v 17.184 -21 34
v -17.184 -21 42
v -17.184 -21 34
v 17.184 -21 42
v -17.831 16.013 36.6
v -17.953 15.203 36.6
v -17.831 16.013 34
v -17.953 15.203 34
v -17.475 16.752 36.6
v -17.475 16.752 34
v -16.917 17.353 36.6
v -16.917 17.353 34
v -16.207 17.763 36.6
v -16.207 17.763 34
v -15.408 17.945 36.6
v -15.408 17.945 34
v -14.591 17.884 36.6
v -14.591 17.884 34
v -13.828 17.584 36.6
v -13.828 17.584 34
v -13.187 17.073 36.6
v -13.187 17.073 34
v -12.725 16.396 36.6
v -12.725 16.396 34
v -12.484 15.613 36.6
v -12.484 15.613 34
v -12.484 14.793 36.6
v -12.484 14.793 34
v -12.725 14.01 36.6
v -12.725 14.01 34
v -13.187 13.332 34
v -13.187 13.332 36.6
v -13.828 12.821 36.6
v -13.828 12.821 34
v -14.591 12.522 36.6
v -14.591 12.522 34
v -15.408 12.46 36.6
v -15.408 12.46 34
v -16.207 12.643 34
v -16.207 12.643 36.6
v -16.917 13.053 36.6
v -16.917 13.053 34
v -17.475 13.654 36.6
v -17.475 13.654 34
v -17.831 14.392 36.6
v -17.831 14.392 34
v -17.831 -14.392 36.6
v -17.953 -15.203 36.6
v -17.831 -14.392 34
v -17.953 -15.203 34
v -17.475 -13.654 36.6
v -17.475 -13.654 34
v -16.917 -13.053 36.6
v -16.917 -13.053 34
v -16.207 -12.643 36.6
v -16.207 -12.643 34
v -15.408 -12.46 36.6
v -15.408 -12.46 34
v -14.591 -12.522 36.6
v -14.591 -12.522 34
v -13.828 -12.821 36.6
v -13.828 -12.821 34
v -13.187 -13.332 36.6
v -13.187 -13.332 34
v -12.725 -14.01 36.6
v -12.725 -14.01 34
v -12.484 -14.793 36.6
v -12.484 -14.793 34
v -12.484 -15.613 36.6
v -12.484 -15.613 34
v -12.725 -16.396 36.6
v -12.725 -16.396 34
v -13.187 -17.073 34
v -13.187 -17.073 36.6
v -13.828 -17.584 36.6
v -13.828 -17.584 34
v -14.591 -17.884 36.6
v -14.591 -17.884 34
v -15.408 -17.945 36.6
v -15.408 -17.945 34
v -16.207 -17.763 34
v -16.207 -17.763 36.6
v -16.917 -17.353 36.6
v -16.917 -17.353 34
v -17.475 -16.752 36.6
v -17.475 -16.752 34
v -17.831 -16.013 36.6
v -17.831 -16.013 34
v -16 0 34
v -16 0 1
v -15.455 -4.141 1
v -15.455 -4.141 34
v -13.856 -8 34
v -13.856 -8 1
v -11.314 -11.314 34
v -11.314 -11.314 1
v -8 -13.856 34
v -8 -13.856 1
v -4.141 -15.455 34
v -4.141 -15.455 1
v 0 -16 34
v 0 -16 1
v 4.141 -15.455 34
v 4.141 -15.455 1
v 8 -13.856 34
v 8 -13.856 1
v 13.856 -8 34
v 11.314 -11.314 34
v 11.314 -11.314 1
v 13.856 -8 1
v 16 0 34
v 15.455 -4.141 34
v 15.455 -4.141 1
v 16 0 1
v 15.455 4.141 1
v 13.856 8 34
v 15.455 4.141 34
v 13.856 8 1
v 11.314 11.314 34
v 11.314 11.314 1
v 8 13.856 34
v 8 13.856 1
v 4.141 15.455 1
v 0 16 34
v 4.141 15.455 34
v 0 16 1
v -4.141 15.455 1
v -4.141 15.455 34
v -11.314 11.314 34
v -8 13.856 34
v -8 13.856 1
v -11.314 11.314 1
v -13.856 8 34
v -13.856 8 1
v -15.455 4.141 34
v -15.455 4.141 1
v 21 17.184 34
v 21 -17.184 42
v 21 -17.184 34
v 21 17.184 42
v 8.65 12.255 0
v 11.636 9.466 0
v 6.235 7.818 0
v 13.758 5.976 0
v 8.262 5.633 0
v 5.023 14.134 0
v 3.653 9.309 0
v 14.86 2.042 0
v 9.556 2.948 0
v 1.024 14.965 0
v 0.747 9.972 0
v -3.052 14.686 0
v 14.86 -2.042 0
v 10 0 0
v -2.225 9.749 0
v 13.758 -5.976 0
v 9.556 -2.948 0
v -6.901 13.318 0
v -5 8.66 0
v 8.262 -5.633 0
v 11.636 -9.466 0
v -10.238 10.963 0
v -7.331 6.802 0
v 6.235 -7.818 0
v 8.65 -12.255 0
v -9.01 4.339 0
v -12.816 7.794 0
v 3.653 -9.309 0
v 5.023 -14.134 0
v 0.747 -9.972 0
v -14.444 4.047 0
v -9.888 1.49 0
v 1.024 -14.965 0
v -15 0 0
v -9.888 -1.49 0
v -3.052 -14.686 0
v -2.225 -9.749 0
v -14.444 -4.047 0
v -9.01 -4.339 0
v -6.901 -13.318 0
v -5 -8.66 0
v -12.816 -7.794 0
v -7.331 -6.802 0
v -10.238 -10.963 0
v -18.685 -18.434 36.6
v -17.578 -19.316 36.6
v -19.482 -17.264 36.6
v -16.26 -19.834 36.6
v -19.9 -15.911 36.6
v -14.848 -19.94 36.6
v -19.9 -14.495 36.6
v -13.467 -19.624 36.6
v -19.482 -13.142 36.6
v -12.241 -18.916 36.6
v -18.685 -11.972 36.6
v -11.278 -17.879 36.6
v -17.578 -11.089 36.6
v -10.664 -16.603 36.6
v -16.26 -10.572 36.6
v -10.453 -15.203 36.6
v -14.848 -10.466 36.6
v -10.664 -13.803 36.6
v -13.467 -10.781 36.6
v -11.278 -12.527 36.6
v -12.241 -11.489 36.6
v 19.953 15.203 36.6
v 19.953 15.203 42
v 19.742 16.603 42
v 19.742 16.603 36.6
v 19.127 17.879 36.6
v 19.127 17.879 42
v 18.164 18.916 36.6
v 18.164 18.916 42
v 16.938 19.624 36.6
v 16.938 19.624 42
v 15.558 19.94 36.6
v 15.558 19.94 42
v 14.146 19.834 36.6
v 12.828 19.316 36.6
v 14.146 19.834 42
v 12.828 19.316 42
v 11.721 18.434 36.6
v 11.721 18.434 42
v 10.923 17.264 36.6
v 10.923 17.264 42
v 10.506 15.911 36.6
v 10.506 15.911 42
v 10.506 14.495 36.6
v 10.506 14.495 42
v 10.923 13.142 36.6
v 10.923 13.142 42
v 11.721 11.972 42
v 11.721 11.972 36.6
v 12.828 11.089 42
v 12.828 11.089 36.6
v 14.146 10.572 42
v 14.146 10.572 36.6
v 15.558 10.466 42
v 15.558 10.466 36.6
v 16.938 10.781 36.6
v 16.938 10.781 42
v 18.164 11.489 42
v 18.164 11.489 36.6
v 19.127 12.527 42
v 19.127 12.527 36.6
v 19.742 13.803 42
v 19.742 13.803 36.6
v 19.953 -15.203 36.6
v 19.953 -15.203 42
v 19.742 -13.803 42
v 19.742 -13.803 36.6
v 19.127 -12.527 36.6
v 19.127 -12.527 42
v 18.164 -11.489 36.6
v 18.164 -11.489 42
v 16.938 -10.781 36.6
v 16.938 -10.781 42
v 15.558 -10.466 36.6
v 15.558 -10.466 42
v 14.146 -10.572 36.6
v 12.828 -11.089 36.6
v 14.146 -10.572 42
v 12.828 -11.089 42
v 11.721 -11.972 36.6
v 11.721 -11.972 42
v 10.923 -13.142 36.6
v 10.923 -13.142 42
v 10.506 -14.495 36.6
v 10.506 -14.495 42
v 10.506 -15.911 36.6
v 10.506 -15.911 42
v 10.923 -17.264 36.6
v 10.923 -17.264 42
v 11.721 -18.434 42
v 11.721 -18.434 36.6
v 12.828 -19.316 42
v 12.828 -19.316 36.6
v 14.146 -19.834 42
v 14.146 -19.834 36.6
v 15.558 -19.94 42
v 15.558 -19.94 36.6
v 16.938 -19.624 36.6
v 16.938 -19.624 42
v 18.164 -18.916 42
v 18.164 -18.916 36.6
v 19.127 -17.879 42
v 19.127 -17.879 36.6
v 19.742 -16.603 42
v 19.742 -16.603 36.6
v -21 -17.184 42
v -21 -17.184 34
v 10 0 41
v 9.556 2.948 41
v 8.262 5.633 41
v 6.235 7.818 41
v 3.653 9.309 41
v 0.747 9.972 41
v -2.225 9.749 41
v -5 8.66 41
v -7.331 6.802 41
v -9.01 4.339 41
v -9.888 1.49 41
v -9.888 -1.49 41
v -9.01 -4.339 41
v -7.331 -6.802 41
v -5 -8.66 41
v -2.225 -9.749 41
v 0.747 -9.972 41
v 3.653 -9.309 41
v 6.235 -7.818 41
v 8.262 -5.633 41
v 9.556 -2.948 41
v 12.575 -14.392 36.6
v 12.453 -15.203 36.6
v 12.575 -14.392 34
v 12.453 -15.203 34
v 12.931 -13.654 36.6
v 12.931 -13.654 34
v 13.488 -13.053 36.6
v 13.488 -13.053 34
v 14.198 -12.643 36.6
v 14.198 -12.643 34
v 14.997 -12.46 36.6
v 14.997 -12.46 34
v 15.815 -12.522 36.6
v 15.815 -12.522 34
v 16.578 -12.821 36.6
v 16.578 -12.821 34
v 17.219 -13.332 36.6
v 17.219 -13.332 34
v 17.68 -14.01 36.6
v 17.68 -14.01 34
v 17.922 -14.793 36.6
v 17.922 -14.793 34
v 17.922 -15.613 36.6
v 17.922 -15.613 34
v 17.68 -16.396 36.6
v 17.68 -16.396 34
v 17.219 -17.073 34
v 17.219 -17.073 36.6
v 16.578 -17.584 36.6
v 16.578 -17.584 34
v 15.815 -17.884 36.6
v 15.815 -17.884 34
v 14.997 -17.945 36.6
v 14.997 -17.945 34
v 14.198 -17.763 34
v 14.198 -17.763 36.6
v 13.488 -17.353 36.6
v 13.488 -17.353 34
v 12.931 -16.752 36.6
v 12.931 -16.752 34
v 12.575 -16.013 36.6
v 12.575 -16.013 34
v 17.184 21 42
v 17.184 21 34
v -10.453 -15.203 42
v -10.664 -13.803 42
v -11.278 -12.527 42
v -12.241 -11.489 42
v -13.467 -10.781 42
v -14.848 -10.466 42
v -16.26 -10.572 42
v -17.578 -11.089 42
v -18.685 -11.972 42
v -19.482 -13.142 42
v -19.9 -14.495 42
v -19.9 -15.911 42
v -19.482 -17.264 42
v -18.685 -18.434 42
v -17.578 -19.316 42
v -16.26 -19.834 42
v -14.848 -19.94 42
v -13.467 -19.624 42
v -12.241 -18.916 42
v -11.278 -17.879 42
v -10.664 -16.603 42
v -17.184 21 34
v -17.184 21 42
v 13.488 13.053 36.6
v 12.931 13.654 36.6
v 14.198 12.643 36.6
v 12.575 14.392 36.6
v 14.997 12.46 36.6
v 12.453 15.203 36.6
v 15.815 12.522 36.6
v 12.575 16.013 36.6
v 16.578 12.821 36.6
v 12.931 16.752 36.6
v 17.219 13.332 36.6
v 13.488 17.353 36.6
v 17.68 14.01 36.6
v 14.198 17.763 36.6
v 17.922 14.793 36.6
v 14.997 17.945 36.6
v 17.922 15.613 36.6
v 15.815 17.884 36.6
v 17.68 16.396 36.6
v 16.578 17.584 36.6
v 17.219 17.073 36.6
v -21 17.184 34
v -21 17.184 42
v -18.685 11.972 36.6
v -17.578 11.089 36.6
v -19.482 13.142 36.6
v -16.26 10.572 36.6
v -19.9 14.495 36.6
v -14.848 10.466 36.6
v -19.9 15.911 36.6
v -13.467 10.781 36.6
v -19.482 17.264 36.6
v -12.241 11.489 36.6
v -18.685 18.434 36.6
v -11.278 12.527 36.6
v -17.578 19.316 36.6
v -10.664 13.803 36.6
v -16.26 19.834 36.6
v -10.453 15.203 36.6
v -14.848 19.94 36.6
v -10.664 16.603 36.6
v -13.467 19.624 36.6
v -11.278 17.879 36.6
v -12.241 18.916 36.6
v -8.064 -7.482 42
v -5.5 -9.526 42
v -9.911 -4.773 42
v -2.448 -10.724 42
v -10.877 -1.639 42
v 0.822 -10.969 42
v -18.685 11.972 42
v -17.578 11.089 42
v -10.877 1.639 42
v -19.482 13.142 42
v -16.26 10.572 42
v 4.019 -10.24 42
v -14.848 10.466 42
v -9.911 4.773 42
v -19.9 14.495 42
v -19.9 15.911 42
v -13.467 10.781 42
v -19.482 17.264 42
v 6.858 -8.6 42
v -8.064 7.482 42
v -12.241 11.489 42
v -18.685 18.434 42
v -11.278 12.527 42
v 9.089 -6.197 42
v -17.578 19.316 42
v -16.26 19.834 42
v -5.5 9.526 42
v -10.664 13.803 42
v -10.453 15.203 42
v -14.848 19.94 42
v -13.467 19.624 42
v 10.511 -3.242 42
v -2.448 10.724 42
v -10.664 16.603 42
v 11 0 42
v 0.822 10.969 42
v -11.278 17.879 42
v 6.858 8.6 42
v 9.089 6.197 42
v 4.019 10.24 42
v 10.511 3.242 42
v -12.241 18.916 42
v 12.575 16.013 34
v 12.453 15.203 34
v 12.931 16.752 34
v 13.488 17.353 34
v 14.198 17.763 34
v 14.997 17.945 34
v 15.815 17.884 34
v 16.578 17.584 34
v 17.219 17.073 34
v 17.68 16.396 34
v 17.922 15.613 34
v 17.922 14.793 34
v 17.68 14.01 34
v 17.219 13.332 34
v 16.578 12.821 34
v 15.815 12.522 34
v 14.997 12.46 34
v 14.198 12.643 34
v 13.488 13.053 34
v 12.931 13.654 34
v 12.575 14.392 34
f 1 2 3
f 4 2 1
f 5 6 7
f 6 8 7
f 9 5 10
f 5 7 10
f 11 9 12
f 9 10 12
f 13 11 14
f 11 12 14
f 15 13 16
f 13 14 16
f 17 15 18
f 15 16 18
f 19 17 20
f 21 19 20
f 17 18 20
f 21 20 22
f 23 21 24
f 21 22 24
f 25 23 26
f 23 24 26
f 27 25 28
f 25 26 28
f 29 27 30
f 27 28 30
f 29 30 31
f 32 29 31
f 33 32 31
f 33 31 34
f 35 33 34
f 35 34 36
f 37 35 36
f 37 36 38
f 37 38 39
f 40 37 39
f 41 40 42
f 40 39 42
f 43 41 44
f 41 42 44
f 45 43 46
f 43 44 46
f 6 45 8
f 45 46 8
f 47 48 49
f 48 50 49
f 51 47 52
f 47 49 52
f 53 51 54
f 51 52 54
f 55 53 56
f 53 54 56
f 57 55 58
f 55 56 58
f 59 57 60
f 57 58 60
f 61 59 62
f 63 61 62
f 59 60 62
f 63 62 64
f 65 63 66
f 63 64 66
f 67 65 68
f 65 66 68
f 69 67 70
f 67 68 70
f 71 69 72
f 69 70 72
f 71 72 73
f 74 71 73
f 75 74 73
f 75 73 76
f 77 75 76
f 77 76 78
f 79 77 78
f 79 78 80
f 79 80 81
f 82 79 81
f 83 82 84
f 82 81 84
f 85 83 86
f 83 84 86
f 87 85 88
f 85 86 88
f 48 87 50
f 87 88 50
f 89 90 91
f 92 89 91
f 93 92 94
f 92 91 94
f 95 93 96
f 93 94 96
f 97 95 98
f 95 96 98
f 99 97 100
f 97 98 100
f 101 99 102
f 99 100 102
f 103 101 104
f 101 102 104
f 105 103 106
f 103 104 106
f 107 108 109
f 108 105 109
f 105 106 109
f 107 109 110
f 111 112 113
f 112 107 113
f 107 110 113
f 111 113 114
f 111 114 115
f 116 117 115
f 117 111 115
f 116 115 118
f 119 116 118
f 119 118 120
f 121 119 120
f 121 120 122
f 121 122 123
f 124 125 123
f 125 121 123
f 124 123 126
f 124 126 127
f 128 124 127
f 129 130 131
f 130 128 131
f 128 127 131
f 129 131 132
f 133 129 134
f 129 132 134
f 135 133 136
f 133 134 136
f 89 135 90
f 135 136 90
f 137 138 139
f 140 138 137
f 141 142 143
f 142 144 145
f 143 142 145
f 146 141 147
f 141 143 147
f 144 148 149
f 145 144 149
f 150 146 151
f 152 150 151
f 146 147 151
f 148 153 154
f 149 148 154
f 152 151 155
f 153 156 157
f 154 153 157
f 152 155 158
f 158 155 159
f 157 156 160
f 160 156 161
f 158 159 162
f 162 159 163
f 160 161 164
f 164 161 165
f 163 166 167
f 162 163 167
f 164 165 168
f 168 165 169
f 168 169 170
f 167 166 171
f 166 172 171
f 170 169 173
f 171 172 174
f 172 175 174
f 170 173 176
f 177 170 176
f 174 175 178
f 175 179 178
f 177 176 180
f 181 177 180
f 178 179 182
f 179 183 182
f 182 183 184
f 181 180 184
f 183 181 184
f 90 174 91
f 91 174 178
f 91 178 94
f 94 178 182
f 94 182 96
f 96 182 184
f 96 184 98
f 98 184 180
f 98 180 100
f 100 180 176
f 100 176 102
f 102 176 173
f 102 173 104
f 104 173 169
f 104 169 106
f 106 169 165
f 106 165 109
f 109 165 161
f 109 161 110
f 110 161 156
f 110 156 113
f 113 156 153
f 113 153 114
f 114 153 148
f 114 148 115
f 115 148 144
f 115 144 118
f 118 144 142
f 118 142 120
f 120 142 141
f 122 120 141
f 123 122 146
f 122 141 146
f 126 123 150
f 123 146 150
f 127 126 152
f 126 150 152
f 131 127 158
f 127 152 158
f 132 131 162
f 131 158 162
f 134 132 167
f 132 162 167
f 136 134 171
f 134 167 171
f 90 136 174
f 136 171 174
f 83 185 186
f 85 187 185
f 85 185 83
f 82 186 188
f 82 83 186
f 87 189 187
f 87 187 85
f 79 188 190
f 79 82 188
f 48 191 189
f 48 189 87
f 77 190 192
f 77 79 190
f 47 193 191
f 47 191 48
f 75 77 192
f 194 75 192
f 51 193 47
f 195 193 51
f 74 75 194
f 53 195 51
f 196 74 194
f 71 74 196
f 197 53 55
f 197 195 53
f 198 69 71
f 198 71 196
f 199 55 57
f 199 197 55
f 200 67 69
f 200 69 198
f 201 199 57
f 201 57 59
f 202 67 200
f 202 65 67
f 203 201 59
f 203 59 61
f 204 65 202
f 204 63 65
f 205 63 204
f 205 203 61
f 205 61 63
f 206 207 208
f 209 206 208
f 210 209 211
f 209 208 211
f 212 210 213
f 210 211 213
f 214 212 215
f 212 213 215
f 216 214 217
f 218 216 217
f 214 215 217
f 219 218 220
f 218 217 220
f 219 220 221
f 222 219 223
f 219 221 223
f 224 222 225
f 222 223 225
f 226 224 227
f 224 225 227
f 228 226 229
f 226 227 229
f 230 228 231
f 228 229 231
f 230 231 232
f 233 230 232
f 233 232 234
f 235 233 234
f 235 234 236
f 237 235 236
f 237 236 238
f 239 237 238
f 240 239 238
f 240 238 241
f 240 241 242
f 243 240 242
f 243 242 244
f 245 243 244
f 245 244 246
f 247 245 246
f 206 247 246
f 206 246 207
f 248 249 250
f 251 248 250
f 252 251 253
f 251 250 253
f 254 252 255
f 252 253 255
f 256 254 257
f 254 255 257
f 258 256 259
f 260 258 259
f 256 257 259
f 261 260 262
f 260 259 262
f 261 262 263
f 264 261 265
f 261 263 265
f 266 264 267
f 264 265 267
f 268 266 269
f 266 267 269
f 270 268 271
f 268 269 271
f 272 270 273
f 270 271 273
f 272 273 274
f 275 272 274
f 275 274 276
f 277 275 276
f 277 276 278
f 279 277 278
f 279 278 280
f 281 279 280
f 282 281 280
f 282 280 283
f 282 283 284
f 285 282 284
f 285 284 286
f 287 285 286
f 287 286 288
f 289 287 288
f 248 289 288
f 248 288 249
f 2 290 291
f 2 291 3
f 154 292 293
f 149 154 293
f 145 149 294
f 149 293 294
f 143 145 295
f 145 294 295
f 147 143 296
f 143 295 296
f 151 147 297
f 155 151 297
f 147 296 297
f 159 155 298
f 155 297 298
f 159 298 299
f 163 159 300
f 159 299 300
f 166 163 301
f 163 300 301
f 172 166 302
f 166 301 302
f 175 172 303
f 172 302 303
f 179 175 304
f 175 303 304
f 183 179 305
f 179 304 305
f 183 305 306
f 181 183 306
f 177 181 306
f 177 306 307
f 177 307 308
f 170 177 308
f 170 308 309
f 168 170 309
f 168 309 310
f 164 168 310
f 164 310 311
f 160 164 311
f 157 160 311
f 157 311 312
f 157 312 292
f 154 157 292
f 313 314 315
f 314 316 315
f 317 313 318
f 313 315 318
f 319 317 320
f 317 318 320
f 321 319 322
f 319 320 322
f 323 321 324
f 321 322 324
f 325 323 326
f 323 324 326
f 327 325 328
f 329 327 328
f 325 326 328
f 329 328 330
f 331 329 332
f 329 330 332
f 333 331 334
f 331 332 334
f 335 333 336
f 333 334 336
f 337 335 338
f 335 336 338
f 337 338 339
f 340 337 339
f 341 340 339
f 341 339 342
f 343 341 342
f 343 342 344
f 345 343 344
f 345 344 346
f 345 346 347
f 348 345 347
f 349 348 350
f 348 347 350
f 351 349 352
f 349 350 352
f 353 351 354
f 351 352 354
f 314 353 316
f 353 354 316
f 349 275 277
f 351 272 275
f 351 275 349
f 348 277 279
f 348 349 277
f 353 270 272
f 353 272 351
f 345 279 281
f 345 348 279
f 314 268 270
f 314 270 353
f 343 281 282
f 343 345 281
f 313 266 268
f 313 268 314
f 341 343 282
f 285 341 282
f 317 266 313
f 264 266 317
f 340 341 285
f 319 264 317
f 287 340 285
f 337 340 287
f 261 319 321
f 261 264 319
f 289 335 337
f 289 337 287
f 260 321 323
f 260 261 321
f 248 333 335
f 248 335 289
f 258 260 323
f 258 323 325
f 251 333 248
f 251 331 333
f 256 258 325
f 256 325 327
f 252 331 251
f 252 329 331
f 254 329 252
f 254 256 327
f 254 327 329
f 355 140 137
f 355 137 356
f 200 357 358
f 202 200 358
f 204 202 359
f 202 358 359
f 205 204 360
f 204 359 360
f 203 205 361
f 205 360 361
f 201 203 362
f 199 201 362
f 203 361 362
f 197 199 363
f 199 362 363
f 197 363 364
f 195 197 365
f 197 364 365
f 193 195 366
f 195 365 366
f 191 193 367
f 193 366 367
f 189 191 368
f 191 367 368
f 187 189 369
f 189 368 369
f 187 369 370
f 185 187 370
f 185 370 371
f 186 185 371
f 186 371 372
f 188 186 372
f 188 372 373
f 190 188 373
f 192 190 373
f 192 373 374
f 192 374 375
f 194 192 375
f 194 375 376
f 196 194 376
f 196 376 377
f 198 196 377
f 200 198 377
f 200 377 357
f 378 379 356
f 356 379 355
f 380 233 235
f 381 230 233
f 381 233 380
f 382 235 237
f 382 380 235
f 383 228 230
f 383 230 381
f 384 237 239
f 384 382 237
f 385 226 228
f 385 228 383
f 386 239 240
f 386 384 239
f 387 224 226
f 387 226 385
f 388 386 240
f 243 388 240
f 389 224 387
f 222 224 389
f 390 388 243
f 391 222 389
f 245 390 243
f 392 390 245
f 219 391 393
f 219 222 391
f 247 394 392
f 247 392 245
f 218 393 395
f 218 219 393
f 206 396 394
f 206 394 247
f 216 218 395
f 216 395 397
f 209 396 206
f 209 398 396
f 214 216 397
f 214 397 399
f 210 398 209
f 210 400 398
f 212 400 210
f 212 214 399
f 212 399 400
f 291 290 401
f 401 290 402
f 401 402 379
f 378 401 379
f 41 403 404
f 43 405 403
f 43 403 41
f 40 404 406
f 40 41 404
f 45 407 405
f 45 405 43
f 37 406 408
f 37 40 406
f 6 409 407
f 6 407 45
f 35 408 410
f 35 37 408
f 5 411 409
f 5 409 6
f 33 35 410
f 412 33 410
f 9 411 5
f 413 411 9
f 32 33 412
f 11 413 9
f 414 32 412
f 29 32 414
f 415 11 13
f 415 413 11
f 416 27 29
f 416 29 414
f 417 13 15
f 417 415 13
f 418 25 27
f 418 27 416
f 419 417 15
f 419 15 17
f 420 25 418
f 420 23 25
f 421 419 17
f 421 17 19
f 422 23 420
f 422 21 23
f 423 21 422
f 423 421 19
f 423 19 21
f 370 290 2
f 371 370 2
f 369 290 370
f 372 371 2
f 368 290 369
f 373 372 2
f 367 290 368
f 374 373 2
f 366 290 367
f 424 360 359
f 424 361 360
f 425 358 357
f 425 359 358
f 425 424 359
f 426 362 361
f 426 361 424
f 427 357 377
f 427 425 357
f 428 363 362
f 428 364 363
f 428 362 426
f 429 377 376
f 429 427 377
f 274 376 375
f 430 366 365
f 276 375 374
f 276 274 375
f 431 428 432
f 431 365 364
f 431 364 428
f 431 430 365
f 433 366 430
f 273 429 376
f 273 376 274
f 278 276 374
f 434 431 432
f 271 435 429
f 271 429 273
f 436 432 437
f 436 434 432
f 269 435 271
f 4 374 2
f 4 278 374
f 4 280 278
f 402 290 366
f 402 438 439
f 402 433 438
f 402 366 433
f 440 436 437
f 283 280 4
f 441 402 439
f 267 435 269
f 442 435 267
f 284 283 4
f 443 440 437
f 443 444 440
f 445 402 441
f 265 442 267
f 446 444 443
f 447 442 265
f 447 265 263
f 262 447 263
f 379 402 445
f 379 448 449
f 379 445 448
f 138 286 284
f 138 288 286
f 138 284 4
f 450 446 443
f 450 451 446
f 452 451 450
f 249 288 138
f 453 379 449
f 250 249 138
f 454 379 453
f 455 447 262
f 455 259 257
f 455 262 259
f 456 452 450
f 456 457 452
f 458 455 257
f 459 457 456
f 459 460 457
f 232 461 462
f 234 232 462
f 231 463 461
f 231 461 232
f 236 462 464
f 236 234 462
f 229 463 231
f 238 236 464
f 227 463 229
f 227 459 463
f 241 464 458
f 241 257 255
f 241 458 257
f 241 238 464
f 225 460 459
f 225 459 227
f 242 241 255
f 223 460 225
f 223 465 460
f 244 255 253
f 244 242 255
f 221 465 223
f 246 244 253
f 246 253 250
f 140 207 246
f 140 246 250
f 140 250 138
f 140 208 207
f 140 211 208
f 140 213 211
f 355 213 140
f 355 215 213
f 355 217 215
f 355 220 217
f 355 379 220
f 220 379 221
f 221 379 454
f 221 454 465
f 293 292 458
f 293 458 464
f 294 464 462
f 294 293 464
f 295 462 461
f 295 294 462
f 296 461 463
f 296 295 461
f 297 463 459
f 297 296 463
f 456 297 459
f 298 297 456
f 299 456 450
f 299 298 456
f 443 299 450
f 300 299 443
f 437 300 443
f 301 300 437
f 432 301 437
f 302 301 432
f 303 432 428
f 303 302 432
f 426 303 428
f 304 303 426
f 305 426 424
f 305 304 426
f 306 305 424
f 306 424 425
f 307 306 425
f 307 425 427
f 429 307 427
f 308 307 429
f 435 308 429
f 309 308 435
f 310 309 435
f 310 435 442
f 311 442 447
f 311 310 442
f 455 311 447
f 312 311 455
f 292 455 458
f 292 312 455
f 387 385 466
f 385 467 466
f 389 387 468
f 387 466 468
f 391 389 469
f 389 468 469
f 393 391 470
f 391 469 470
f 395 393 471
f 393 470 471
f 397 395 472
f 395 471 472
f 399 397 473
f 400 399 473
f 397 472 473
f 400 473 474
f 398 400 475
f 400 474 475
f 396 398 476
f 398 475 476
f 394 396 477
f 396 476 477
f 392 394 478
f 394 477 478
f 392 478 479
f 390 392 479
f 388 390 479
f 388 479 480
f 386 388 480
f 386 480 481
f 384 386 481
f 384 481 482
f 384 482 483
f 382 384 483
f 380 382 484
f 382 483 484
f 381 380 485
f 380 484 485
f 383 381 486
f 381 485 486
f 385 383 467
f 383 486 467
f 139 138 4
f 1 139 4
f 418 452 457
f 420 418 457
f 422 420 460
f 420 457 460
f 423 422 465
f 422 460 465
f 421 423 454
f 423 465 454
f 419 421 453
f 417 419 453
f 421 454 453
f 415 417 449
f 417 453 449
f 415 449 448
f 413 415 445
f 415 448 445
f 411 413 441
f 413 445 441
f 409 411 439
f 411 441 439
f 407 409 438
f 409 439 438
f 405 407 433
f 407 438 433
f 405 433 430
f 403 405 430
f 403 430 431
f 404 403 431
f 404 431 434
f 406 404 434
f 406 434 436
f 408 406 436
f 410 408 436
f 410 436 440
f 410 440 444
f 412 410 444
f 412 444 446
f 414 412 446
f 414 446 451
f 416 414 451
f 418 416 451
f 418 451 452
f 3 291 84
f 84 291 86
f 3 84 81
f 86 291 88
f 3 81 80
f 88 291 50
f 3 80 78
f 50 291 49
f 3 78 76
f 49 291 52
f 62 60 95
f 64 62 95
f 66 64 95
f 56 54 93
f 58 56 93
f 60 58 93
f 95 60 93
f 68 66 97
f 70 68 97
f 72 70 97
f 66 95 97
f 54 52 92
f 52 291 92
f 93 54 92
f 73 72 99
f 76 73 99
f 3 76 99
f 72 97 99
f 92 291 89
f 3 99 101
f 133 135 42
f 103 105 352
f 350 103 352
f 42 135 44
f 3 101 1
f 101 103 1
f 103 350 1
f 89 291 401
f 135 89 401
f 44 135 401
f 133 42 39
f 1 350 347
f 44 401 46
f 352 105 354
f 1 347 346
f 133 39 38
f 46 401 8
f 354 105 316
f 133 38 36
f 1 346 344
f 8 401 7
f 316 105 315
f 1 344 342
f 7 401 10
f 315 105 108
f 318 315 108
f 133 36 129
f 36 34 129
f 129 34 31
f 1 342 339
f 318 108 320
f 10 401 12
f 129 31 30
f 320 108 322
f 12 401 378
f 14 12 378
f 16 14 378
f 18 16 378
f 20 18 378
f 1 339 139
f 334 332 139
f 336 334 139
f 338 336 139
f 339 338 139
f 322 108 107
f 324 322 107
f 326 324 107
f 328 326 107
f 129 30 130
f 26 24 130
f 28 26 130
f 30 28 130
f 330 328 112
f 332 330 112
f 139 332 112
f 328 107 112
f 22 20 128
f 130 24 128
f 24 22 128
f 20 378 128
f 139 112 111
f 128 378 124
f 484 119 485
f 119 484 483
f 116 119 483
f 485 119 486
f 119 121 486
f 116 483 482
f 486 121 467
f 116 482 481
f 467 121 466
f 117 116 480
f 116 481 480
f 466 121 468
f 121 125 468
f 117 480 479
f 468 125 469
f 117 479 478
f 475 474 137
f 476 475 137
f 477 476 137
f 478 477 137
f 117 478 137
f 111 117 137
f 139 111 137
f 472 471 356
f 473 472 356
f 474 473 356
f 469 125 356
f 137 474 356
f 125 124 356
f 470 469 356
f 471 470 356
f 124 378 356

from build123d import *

# Parameters (mm, degrees)
SKETCH1_R                                           = 16
BOSS_EXTRUDE1_DEPTH                                 = 42
SKETCH2_W                                           = 42
SKETCH2_H                                           = 42
BOSS_EXTRUDE2_DEPTH                                 = 8
CUT_EXTRUDE1_DEPTH                                  = 52.439284598
CBORE_FOR_M5_HEX_SOCKET_HEAD_CAP_SCREW1_D           = 5.5
CBORE_FOR_M5_HEX_SOCKET_HEAD_CAP_SCREW1_DEPTH       = 22
CBORE_FOR_M5_HEX_SOCKET_HEAD_CAP_SCREW1_CBORE_D     = 9.5
CBORE_FOR_M5_HEX_SOCKET_HEAD_CAP_SCREW1_CBORE_DEPTH = 5.4
CBORE_FOR_M5_HEX_SOCKET_HEAD_CAP_SCREW1_TIP         = 1.652366702
SKETCH8_R                                           = 10
CUT_EXTRUDE2_DEPTH                                  = 52.439284598
CHAMFER1_SIZE                                       = 1


with BuildPart() as part:
    # Sketch1 → Boss-Extrude1 (new body)
    with BuildSketch(Plane.XY):
        with Locations(Location((0, 0, 0), (0, 0, 180))):
            Circle(SKETCH1_R)
    extrude(amount=BOSS_EXTRUDE1_DEPTH)

    # Sketch2 → Boss-Extrude2 (add)
    with BuildSketch(Plane.XY.offset(42)):
        Rectangle(SKETCH2_W, SKETCH2_H)
    extrude(amount=-BOSS_EXTRUDE2_DEPTH)

    # Sketch4 → Cut-Extrude1 (cut, through all)
    with BuildSketch(Plane.XY.offset(42)):
        Polygon((-21, 21), (-21, 17.183766184), (-17.183766184, 21), align=None)
        Polygon((17.183766184, 21), (21, 21), (21, 17.183766184), align=None)
        Polygon((21, -21), (21, -17.183766184), (17.183766184, -21), align=None)
        Polygon((-17.183766184, -21), (-21, -21), (-21, -17.183766184), align=None)
    extrude(amount=-CUT_EXTRUDE1_DEPTH, mode=Mode.SUBTRACT)

    # CBORE for M5 Hex Socket Head Cap Screw1
    with Locations(Plane.XY.offset(42)):
        with Locations((-15.202795796, 15.202795796), (15.202795796, 15.202795796), (15.202795796, -15.202795796), (-15.202795796, -15.202795796)):
            CounterBoreHole(CBORE_FOR_M5_HEX_SOCKET_HEAD_CAP_SCREW1_D / 2, CBORE_FOR_M5_HEX_SOCKET_HEAD_CAP_SCREW1_CBORE_D / 2, CBORE_FOR_M5_HEX_SOCKET_HEAD_CAP_SCREW1_CBORE_DEPTH, depth=CBORE_FOR_M5_HEX_SOCKET_HEAD_CAP_SCREW1_DEPTH)
            with Locations((0, 0, -(CBORE_FOR_M5_HEX_SOCKET_HEAD_CAP_SCREW1_DEPTH + CBORE_FOR_M5_HEX_SOCKET_HEAD_CAP_SCREW1_TIP / 2))):  # 118° drill point
                Cone(0, CBORE_FOR_M5_HEX_SOCKET_HEAD_CAP_SCREW1_D / 2, CBORE_FOR_M5_HEX_SOCKET_HEAD_CAP_SCREW1_TIP, mode=Mode.SUBTRACT)

    # Sketch8 → Cut-Extrude2 (cut, through all)
    with BuildSketch(Plane.XY.offset(42)):
        Circle(SKETCH8_R)
    extrude(amount=-CUT_EXTRUDE2_DEPTH, mode=Mode.SUBTRACT)

    # Chamfer1
    chamfer1_edges = [part.edges().sort_by_distance(p)[0] for p in [
        (-10, 0, 42),
        (16, 0, 0),
    ]]
    chamfer(chamfer1_edges, length=CHAMFER1_SIZE)


solid = part.part
